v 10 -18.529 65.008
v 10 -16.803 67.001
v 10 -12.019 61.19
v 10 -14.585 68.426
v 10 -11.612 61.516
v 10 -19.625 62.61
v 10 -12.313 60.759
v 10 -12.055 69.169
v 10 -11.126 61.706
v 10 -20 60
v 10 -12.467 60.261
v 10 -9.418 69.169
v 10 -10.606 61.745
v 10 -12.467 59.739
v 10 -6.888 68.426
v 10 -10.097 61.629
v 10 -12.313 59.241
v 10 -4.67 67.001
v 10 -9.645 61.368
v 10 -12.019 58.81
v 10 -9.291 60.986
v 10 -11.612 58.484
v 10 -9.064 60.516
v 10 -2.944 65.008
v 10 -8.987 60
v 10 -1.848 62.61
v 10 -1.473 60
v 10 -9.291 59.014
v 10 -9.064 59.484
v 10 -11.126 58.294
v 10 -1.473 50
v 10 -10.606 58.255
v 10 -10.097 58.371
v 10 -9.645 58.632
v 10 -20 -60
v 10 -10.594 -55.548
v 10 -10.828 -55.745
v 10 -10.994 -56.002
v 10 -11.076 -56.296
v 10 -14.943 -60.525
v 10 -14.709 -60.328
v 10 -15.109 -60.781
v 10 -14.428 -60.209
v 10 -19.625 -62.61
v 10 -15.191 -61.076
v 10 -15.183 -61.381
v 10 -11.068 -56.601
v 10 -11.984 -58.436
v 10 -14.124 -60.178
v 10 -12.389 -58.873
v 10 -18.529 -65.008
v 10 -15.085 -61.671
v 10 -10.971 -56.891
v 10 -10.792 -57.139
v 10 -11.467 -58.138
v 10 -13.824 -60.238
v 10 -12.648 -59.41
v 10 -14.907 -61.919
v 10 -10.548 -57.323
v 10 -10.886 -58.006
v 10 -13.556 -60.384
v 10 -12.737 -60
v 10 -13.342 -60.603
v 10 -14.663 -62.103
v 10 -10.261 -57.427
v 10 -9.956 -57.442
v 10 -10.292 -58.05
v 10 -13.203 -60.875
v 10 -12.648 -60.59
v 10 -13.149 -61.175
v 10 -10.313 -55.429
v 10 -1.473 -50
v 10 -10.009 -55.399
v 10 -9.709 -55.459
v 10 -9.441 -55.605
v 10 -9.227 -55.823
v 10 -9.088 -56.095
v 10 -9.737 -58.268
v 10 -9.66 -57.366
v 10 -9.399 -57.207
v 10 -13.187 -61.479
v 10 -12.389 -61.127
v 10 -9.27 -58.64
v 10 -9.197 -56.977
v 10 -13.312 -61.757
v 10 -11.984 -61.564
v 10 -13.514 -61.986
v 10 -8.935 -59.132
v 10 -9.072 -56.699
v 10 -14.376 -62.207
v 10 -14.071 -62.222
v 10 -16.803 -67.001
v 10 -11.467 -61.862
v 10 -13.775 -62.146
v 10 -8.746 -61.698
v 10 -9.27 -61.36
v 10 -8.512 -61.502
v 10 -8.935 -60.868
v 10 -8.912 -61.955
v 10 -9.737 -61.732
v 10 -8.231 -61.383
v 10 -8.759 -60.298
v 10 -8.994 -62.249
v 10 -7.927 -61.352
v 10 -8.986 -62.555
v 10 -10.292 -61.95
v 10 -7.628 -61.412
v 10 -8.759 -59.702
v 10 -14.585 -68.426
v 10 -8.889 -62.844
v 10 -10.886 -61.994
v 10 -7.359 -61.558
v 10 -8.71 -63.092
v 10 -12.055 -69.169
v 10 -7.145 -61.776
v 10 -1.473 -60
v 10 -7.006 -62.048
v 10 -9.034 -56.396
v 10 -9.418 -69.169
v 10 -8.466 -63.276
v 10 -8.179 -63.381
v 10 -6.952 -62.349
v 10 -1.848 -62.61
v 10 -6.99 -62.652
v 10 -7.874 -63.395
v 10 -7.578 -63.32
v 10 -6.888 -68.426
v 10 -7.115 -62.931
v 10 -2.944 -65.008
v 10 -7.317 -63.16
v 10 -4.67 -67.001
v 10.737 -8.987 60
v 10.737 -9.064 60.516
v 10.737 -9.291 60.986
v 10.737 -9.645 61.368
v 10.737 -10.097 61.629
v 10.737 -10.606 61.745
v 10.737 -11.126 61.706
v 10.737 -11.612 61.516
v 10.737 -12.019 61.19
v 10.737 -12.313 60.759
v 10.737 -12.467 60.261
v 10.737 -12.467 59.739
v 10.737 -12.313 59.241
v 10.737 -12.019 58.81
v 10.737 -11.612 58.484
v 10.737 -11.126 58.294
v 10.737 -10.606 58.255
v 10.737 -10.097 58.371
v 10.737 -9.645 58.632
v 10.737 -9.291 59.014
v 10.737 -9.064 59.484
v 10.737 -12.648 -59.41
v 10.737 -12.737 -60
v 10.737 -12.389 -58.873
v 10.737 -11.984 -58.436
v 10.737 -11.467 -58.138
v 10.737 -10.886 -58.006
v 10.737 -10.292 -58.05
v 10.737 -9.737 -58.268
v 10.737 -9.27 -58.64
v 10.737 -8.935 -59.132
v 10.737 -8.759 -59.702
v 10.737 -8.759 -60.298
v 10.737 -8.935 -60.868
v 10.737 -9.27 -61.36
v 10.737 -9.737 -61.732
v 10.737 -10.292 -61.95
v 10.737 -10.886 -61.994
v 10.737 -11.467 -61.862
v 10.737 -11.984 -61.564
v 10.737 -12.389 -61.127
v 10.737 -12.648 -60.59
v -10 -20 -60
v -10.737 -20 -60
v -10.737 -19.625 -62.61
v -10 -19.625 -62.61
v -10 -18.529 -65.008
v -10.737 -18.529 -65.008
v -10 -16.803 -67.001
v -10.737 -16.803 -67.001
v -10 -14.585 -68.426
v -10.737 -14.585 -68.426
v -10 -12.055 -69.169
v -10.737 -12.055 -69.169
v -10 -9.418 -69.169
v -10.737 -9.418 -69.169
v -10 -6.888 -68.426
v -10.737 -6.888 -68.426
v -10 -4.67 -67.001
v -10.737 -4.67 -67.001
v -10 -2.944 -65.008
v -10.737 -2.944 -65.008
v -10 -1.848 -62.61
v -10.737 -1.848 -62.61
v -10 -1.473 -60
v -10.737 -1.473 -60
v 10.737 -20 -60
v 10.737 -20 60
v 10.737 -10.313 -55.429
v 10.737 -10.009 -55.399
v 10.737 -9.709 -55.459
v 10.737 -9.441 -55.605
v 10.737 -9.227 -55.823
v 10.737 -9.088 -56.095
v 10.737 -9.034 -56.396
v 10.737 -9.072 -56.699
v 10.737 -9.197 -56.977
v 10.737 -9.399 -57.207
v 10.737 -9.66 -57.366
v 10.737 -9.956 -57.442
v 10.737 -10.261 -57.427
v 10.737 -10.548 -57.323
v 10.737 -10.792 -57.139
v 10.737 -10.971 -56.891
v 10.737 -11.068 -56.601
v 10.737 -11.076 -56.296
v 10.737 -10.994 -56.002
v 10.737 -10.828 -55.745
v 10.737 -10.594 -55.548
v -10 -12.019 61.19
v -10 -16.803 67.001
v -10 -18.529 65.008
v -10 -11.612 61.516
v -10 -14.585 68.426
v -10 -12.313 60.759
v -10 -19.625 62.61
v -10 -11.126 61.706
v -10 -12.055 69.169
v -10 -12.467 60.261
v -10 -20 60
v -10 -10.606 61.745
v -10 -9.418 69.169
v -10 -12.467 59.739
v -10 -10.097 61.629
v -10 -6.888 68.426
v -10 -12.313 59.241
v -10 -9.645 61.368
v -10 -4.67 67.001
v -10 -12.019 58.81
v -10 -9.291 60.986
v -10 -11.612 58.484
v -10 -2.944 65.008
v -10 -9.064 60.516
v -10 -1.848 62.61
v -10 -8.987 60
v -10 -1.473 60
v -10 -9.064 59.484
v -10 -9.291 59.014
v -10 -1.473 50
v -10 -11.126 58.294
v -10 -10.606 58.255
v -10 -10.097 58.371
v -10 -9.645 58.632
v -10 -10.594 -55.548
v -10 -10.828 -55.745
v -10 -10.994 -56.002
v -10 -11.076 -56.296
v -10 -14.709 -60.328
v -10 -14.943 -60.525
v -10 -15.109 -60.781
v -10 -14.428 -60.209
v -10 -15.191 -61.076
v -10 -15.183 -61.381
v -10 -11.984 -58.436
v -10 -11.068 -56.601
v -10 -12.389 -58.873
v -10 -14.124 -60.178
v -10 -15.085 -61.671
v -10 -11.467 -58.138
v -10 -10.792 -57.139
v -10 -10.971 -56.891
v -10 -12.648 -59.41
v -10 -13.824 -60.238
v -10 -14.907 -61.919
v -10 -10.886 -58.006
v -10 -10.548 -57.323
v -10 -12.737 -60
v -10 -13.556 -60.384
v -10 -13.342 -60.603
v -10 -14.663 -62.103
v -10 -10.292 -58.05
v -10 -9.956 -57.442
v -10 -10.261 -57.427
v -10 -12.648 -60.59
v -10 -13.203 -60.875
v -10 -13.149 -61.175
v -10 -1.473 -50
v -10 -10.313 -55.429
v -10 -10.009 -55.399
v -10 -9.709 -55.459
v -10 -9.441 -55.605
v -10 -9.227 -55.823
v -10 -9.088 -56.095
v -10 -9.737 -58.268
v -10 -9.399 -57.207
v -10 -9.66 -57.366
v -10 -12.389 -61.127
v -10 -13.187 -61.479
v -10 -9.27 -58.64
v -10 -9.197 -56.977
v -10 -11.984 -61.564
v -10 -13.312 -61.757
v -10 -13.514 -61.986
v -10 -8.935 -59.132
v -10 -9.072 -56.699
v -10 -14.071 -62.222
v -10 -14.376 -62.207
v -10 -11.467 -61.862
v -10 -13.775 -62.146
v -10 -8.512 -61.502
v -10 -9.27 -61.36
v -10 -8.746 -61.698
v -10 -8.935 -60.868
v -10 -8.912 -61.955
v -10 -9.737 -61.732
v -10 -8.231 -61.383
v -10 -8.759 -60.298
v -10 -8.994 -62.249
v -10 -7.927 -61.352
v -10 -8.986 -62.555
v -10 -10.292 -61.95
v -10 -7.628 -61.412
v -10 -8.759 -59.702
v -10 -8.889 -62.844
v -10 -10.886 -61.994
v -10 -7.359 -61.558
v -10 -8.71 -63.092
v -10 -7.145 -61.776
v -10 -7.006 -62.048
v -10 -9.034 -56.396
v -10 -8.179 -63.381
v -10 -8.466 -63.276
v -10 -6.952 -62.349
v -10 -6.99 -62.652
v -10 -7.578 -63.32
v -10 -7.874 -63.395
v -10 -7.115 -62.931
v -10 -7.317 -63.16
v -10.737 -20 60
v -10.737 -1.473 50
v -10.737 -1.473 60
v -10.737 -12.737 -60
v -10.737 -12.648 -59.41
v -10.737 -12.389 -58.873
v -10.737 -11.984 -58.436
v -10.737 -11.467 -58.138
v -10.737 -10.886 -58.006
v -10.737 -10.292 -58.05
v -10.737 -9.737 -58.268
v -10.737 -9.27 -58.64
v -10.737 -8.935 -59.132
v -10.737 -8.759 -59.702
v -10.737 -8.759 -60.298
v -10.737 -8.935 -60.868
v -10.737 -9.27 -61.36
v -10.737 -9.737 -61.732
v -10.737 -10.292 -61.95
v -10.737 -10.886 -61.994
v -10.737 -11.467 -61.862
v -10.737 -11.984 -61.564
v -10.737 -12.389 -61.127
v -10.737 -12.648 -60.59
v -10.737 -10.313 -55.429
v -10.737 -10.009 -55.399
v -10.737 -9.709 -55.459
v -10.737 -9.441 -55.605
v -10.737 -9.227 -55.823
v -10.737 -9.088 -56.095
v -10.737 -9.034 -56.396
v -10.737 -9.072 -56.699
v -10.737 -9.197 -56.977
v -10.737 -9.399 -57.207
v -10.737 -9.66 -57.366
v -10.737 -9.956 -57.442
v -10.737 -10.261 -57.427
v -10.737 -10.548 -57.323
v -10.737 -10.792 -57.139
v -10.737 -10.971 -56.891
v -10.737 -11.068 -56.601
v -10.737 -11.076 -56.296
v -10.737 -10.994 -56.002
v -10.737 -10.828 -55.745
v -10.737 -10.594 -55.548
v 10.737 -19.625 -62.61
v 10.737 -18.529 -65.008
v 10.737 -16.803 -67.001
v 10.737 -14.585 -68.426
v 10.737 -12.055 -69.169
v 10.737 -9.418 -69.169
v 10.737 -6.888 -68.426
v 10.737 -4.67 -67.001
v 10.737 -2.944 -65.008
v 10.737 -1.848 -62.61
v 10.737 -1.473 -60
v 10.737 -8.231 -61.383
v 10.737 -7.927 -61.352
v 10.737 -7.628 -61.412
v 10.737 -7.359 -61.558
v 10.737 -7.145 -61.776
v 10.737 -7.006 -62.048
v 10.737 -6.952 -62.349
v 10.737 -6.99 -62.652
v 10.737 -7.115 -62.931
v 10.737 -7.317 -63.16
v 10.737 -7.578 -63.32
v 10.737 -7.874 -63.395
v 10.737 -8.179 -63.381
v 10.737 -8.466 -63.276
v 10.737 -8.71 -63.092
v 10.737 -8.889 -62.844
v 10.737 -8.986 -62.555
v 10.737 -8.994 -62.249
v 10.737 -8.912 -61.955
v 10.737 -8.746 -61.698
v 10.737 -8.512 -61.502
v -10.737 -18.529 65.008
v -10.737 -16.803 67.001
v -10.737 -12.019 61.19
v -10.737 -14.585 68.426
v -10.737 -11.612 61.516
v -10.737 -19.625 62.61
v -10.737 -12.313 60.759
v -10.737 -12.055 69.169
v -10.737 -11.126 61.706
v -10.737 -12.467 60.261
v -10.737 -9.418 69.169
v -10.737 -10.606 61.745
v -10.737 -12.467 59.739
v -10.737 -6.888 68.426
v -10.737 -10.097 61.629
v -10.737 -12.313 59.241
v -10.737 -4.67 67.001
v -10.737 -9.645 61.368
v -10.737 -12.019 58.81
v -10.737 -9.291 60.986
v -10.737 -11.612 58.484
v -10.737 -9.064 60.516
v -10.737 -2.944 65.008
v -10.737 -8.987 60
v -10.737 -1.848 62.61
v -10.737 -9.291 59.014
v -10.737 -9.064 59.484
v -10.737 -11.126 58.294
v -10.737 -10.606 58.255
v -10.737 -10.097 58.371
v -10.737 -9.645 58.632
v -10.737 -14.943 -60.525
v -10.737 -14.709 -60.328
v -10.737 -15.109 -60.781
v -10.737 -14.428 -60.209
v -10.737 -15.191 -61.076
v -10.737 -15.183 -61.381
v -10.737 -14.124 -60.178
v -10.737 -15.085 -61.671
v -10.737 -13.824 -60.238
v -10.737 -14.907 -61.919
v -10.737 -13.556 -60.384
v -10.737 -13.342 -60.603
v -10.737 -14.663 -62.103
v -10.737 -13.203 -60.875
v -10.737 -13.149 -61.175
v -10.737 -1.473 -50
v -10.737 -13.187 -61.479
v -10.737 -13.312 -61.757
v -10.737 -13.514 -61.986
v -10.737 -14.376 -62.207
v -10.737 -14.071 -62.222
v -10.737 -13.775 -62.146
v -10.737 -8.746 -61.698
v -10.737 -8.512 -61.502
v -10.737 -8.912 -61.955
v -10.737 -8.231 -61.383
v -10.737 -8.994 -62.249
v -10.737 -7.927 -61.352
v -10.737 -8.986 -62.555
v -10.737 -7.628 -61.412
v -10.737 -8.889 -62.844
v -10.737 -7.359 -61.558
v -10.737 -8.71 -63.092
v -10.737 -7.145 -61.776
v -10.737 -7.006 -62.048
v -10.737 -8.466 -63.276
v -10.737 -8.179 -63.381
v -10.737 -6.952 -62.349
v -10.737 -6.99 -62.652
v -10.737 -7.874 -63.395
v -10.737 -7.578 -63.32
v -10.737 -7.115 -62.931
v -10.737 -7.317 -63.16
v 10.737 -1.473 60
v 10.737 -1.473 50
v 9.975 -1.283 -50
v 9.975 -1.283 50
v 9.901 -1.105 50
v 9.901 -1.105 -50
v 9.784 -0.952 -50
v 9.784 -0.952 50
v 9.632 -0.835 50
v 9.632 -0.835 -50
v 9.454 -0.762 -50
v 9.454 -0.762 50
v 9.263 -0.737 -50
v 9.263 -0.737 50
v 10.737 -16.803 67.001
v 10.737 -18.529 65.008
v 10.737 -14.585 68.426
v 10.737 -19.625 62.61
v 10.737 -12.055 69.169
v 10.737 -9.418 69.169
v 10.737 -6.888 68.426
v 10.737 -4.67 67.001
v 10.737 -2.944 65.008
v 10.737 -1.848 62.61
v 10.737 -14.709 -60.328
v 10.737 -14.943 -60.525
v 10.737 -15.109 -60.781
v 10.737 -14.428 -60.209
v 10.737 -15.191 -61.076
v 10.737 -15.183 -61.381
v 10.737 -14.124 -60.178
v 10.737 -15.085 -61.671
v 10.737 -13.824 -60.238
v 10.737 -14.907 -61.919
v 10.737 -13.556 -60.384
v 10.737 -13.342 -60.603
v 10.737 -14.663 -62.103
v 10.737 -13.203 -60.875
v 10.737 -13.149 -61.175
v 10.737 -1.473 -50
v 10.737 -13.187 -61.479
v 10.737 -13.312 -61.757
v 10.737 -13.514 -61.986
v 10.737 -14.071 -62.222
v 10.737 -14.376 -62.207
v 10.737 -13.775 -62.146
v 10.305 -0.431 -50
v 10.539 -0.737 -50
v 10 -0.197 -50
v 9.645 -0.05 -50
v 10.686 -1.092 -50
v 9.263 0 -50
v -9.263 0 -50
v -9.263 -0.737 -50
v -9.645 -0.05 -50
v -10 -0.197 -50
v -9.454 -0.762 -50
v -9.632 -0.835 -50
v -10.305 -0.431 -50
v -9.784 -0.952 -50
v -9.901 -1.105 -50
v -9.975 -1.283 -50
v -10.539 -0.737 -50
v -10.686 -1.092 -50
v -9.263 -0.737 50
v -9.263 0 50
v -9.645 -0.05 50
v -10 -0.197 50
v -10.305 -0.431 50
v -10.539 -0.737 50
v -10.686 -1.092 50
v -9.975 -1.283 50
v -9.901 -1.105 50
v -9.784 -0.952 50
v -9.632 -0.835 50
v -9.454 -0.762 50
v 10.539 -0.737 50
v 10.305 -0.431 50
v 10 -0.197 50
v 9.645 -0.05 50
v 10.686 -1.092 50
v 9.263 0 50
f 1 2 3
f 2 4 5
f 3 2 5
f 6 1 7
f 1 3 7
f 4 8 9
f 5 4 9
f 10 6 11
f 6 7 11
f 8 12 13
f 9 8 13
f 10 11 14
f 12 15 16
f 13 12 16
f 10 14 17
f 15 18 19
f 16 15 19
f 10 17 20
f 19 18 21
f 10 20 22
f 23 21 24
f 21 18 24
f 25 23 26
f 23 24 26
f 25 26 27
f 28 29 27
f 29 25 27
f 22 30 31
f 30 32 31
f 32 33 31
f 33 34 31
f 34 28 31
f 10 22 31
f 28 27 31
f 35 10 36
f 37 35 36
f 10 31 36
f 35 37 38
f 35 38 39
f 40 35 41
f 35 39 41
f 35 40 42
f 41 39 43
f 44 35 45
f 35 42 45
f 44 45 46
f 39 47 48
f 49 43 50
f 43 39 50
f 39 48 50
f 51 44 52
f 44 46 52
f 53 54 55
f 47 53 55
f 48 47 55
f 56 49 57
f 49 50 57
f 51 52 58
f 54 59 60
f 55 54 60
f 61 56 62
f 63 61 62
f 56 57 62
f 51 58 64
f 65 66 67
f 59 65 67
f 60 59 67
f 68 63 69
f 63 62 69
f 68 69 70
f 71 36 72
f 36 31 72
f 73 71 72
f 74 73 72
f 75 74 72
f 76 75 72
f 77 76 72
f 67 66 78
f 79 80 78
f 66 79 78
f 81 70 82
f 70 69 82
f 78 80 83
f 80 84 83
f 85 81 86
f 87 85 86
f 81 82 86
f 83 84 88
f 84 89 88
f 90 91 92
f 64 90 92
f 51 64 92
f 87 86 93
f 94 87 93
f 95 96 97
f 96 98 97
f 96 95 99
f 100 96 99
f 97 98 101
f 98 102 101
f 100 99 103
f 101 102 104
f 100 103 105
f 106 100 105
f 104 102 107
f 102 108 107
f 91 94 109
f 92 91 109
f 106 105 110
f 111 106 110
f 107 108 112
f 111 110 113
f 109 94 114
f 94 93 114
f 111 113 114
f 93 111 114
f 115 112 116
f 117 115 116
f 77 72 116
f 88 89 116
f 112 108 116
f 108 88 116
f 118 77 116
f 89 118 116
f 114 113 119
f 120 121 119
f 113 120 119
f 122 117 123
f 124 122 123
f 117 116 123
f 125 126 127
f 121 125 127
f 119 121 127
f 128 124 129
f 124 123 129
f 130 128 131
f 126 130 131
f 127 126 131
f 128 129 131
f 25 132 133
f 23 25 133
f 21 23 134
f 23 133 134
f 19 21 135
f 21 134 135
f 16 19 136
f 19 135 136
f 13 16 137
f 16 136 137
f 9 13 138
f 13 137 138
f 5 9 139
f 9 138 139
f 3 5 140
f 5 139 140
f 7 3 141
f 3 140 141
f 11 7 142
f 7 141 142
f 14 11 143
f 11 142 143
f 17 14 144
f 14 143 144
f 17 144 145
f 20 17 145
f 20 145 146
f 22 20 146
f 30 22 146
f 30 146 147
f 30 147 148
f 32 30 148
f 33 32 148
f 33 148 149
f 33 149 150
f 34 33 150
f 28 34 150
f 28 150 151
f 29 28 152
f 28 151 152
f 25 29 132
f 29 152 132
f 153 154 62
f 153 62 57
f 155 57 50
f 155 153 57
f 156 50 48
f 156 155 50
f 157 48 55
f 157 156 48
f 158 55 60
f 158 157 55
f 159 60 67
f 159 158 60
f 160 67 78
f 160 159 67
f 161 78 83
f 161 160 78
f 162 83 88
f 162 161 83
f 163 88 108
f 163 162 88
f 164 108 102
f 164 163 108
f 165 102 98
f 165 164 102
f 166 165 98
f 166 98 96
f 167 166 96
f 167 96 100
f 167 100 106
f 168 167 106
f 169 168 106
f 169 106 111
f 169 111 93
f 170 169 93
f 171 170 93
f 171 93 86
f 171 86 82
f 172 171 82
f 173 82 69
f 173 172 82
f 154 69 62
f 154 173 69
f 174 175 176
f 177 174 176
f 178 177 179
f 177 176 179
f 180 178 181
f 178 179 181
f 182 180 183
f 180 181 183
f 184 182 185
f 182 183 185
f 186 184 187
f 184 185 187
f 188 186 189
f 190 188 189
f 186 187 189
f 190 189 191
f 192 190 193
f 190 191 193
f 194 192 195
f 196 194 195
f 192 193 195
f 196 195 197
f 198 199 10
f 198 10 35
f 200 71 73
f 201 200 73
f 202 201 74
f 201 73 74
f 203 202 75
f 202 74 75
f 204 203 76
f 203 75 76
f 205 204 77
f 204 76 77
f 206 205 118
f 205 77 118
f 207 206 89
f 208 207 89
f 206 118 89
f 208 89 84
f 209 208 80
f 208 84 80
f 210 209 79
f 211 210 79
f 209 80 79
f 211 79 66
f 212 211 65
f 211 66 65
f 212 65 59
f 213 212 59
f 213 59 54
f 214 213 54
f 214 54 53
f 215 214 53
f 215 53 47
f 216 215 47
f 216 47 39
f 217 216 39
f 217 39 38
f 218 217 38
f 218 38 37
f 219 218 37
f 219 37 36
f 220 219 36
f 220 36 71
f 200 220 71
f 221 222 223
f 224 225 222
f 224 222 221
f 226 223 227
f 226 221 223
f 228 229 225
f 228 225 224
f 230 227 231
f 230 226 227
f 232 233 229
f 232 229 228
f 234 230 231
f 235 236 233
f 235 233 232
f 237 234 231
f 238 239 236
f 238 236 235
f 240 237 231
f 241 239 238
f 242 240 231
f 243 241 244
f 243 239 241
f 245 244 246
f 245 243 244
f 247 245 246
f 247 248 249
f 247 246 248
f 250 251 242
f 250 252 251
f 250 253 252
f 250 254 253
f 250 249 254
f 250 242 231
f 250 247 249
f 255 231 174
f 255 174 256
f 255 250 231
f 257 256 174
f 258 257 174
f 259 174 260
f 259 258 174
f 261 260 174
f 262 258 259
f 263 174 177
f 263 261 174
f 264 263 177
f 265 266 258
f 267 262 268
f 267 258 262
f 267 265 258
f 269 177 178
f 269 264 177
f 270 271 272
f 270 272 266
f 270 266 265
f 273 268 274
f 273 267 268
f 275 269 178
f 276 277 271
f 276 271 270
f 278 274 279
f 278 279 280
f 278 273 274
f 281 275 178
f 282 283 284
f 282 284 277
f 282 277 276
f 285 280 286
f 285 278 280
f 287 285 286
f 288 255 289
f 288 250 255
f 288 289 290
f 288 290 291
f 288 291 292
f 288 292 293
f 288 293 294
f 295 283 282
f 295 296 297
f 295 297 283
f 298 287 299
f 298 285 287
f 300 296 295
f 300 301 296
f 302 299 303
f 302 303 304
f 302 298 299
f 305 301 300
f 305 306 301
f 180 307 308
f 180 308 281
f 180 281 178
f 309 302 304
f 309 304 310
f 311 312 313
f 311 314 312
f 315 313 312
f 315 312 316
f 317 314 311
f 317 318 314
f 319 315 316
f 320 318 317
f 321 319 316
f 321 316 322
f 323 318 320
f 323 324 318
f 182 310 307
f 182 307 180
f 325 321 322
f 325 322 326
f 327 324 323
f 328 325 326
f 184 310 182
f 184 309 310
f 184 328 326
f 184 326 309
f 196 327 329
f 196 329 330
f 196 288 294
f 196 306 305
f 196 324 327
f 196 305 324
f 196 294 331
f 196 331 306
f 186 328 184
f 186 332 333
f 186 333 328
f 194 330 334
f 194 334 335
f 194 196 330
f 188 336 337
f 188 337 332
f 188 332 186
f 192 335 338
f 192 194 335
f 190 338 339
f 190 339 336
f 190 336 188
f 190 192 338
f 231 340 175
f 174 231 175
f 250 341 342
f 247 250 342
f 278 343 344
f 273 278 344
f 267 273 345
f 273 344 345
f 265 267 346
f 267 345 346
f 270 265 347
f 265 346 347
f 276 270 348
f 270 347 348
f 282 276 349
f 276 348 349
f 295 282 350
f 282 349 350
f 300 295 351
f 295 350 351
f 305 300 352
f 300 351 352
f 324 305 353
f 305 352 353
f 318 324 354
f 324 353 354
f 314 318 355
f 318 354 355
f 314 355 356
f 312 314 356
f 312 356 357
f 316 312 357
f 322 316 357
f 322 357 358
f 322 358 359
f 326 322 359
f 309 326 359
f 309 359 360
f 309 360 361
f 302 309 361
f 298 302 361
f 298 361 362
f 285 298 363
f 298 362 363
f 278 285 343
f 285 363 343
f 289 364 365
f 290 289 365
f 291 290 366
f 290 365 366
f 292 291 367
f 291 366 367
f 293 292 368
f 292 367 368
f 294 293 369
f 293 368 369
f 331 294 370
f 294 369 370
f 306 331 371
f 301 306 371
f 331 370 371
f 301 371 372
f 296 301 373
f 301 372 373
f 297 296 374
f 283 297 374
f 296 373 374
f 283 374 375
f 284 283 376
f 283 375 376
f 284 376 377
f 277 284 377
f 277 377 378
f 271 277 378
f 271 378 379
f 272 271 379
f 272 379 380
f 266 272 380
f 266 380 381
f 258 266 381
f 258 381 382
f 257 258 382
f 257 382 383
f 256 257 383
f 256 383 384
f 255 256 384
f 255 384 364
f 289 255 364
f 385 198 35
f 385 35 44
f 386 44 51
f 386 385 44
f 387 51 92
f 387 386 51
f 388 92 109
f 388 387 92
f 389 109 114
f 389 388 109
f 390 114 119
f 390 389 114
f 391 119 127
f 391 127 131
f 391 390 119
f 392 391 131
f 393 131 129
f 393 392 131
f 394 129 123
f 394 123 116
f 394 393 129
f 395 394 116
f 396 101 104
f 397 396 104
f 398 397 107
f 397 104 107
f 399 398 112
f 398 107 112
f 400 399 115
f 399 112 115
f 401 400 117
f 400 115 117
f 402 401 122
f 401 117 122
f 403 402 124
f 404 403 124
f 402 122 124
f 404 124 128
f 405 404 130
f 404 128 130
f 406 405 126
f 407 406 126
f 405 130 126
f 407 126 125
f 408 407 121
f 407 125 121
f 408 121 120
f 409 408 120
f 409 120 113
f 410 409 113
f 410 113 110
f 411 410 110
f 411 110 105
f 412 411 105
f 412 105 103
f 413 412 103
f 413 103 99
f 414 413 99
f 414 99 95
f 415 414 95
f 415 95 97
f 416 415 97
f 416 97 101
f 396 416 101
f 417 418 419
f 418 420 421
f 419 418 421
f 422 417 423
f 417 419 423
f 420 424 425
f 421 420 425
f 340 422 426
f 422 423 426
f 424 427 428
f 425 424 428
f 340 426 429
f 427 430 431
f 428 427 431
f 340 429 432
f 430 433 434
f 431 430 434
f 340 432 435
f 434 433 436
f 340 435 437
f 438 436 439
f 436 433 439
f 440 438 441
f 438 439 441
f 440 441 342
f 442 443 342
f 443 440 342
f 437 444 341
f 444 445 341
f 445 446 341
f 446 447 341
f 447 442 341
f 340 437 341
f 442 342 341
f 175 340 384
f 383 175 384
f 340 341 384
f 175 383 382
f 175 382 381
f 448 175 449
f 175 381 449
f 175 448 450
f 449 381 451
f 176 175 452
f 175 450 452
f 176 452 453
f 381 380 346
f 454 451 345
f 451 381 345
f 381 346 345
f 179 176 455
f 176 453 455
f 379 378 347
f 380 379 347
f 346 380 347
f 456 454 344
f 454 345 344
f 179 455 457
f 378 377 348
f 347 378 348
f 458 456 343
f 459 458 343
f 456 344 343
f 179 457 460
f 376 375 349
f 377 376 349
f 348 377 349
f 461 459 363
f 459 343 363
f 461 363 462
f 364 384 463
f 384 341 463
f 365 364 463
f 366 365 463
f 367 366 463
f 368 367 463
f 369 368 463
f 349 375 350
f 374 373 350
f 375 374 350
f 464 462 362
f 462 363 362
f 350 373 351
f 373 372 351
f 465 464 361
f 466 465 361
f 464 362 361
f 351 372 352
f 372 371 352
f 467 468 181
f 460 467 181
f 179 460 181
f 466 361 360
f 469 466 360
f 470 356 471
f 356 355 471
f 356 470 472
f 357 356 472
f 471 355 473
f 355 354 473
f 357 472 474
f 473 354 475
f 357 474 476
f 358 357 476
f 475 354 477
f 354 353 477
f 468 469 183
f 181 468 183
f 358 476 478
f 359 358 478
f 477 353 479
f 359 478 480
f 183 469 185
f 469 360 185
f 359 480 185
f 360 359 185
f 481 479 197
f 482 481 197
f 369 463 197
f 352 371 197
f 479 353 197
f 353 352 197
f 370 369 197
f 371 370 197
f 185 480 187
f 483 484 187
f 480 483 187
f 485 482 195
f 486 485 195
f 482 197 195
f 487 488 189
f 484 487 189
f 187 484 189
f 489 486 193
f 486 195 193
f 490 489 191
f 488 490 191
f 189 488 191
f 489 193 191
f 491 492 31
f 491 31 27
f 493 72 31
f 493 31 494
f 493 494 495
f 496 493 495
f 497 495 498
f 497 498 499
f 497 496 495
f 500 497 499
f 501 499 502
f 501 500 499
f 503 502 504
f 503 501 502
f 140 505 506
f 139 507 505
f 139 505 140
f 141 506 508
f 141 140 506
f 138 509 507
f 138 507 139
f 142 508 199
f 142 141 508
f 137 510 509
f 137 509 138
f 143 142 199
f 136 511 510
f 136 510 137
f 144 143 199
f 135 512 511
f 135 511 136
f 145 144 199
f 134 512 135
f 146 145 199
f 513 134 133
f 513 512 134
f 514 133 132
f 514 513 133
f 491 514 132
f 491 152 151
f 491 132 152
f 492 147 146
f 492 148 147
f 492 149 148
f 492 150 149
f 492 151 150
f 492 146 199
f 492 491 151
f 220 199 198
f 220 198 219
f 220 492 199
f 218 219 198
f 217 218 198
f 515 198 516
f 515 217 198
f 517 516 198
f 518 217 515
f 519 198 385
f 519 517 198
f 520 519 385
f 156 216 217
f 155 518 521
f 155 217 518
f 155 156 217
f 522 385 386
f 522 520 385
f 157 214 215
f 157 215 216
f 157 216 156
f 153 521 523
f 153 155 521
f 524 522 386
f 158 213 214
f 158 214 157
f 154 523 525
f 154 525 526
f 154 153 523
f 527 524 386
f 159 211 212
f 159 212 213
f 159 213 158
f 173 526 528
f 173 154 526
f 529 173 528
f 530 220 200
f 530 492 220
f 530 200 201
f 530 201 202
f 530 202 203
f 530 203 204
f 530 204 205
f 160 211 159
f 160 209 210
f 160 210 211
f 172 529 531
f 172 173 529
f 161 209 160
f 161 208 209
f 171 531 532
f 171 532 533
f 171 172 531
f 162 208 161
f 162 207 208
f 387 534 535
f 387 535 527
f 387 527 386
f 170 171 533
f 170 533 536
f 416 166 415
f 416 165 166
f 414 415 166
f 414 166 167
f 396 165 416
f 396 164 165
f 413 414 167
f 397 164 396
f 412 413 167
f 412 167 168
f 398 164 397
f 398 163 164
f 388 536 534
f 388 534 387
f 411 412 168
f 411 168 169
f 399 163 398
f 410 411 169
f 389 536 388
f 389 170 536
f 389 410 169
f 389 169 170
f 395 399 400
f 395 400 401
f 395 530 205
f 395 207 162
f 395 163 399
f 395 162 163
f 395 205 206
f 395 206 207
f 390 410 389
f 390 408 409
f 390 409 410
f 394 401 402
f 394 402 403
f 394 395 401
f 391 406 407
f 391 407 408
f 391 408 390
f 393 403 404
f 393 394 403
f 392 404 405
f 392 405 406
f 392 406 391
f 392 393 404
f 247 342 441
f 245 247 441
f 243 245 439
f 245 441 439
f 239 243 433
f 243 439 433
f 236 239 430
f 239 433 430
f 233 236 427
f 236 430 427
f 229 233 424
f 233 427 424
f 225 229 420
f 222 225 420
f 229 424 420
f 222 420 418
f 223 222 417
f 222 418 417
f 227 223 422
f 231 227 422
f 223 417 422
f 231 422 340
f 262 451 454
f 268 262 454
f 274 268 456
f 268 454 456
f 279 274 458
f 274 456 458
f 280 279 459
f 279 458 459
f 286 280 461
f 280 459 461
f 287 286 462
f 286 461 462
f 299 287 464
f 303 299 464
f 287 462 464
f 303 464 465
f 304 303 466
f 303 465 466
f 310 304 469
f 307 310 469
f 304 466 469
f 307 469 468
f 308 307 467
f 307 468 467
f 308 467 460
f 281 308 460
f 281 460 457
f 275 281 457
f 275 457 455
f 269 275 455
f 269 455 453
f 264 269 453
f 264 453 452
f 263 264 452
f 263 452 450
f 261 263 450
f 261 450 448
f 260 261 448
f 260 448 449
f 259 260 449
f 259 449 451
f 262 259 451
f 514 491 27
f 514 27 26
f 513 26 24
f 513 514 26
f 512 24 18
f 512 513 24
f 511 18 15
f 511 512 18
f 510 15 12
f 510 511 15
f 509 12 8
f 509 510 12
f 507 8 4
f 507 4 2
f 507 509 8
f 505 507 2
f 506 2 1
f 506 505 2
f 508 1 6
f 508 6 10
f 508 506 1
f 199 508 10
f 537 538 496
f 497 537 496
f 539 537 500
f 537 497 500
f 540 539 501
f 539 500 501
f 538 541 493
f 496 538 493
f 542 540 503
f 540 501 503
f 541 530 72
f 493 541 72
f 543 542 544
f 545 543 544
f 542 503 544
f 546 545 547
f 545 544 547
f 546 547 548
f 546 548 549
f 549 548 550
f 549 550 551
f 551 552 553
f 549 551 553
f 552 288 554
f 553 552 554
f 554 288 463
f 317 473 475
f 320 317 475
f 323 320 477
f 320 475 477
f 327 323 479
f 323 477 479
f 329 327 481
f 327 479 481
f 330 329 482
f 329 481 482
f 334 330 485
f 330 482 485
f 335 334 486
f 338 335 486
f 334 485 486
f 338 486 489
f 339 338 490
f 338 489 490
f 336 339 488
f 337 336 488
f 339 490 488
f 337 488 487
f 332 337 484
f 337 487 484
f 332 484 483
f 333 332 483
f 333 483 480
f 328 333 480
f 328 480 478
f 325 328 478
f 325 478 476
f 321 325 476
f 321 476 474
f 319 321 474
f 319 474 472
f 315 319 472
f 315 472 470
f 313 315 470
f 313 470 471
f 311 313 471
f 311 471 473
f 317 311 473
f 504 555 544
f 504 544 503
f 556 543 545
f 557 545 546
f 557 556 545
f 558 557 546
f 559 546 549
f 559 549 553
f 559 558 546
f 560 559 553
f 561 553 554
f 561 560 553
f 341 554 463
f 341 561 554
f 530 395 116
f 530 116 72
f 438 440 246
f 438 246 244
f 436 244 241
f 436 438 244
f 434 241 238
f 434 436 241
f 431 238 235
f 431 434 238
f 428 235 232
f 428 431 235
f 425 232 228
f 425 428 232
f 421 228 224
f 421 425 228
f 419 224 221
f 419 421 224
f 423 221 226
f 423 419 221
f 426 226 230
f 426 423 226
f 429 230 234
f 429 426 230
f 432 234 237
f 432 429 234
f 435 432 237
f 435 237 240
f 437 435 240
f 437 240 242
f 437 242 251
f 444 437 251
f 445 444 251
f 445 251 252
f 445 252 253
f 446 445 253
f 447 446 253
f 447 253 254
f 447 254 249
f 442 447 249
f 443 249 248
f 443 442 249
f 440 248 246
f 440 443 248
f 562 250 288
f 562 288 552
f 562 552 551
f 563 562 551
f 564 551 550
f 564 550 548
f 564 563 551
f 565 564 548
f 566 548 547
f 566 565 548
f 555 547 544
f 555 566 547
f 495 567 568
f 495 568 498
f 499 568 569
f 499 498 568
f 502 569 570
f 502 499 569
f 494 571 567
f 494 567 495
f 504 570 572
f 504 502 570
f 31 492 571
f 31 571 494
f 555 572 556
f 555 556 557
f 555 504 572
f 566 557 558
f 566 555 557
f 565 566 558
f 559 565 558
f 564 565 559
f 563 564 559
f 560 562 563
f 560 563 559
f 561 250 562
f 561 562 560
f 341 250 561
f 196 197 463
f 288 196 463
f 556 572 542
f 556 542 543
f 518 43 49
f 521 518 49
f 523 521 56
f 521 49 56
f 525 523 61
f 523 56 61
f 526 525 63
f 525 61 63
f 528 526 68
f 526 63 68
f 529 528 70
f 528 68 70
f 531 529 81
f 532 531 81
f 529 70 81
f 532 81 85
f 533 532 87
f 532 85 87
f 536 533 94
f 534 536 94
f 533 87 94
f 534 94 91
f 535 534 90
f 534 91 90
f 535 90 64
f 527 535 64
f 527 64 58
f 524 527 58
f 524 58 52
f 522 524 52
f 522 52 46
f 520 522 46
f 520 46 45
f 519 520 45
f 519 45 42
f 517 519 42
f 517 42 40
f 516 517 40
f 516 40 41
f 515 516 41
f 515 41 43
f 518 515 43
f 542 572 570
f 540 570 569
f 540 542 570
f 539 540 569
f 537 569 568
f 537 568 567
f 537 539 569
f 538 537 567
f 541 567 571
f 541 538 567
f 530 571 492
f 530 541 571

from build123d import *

# Parameters (mm, degrees)
SKETCH1_W                    = 18
SKETCH1_H                    = 100
BASE_FLANGE1_DEPTH           = 0.7366
EDGE_FLANGE1_DEPTH           = 100
EDGE_FLANGE1_BEND_DEPTH      = 100
SKETCH12_R                   = 2
TAB1_DEPTH                   = 0.7366
SKETCH15_R                   = 1.75
TAB2_DEPTH                   = 0.7366
F_2_05_2_05_DIAMETER_HOLE1_D = 2.05


# Sheet-metal steps are written as plain solids
with BuildPart() as part:
    # Sketch1 → Base-Flange1 (new body)
    with BuildSketch(Plane(origin=(0, 0, 0), x_dir=(1, 0, 0), z_dir=(0, 1, 0))):
        Rectangle(SKETCH1_W, SKETCH1_H)
    extrude(amount=-BASE_FLANGE1_DEPTH)

    # Edge-Flange1 section (across the edge) → Edge-Flange1 (add)
    with BuildSketch(Plane(origin=(10, -0.7366, -50), x_dir=(-1, 0, 0), z_dir=(0, 0, 1))):
        with BuildLine():
            Line((-0.7366, 0.7366), (-0.7366, 19.2634))
            Line((-0.7366, 19.2634), (0, 19.2634))
            Line((0, 19.2634), (0, 0.7366))
            ThreePointArc((0, 0.7366), (0.215745145, 0.215745145), (0.7366, 0))
            Line((0.7366, 0), (1, 0))
            Line((1, 0), (1, -0.7366))
            Line((1, -0.7366), (0.7366, -0.7366))
            ThreePointArc((0.7366, -0.7366), (-0.30510971, -0.30510971), (-0.7366, 0.7366))
        make_face()
    extrude(amount=EDGE_FLANGE1_DEPTH)

    # Edge-Flange1 section 2 (across the edge) → Edge-Flange1 bend (add)
    with BuildSketch(Plane(origin=(-10, -0.7366, 50), x_dir=(1, 0, 0), z_dir=(0, 0, -1))):
        with BuildLine():
            Line((-0.7366, 0.7366), (-0.7366, 19.2634))
            Line((-0.7366, 19.2634), (0, 19.2634))
            Line((0, 19.2634), (0, 0.7366))
            ThreePointArc((0, 0.7366), (0.215745145, 0.215745145), (0.7366, 0))
            Line((0.7366, 0), (1, 0))
            Line((1, 0), (1, -0.7366))
            Line((1, -0.7366), (0.7366, -0.7366))
            ThreePointArc((0.7366, -0.7366), (-0.30510971, -0.30510971), (-0.7366, 0.7366))
        make_face()
    extrude(amount=EDGE_FLANGE1_BEND_DEPTH)

    # Sketch12 → Tab1 (add)
    with BuildSketch(Plane.ZY.offset(10.7366)):
        with BuildLine():
            Line((-50, -1.4732), (-50, -20))
            Line((-50, -20), (-60, -20))
            ThreePointArc((-60, -20), (-69.2634, -10.7366), (-60, -1.4732))
            Line((-60, -1.4732), (-50, -1.4732))
        make_face()
        with Locations(Location((-60, -10.7366, 0), (0, 0, 270))):
            Circle(SKETCH12_R, mode=Mode.SUBTRACT)
    tab1 = extrude(amount=-TAB1_DEPTH)

    # Mirror1: Tab1 across plane
    add(tab1.mirror(Plane(origin=(0, 0, 0), x_dir=(0, 0, 1), z_dir=(1, 0, 0))))

    # Sketch15 → Tab2 (add)
    with BuildSketch(Plane(origin=(10.7366, 0, 0), x_dir=(0, 0, -1), z_dir=(1, 0, 0))):
        with BuildLine():
            Line((-50, -20), (-50, -1.4732))
            Line((-50, -1.4732), (-60, -1.4732))
            ThreePointArc((-60, -1.4732), (-69.2634, -10.7366), (-60, -20))
            Line((-60, -20), (-50, -20))
        make_face()
        with Locations(Location((-60, -10.7366, 0), (0, 0, 90))):
            Circle(SKETCH15_R, mode=Mode.SUBTRACT)
    tab2 = extrude(amount=-TAB2_DEPTH)

    # Mirror4: Tab2 across plane
    add(tab2.mirror(Plane(origin=(0, 0, 0), x_dir=(0, 0, 1), z_dir=(1, 0, 0))))

    # Ø2.05 (2.05) Diameter Hole1 (through all)
    with Locations(Plane(origin=(10.7366, -177.313180916, -73.74616676), x_dir=(0, 0.24782925197186137, -0.9688037272157182), z_dir=(1, 0, 0))):
        with Locations((24.667042937, 166.329840483), (30.950682453, 166.871449852), (28.277910167, 161.158853719)):
            Hole(F_2_05_2_05_DIAMETER_HOLE1_D / 2)


solid = part.part
